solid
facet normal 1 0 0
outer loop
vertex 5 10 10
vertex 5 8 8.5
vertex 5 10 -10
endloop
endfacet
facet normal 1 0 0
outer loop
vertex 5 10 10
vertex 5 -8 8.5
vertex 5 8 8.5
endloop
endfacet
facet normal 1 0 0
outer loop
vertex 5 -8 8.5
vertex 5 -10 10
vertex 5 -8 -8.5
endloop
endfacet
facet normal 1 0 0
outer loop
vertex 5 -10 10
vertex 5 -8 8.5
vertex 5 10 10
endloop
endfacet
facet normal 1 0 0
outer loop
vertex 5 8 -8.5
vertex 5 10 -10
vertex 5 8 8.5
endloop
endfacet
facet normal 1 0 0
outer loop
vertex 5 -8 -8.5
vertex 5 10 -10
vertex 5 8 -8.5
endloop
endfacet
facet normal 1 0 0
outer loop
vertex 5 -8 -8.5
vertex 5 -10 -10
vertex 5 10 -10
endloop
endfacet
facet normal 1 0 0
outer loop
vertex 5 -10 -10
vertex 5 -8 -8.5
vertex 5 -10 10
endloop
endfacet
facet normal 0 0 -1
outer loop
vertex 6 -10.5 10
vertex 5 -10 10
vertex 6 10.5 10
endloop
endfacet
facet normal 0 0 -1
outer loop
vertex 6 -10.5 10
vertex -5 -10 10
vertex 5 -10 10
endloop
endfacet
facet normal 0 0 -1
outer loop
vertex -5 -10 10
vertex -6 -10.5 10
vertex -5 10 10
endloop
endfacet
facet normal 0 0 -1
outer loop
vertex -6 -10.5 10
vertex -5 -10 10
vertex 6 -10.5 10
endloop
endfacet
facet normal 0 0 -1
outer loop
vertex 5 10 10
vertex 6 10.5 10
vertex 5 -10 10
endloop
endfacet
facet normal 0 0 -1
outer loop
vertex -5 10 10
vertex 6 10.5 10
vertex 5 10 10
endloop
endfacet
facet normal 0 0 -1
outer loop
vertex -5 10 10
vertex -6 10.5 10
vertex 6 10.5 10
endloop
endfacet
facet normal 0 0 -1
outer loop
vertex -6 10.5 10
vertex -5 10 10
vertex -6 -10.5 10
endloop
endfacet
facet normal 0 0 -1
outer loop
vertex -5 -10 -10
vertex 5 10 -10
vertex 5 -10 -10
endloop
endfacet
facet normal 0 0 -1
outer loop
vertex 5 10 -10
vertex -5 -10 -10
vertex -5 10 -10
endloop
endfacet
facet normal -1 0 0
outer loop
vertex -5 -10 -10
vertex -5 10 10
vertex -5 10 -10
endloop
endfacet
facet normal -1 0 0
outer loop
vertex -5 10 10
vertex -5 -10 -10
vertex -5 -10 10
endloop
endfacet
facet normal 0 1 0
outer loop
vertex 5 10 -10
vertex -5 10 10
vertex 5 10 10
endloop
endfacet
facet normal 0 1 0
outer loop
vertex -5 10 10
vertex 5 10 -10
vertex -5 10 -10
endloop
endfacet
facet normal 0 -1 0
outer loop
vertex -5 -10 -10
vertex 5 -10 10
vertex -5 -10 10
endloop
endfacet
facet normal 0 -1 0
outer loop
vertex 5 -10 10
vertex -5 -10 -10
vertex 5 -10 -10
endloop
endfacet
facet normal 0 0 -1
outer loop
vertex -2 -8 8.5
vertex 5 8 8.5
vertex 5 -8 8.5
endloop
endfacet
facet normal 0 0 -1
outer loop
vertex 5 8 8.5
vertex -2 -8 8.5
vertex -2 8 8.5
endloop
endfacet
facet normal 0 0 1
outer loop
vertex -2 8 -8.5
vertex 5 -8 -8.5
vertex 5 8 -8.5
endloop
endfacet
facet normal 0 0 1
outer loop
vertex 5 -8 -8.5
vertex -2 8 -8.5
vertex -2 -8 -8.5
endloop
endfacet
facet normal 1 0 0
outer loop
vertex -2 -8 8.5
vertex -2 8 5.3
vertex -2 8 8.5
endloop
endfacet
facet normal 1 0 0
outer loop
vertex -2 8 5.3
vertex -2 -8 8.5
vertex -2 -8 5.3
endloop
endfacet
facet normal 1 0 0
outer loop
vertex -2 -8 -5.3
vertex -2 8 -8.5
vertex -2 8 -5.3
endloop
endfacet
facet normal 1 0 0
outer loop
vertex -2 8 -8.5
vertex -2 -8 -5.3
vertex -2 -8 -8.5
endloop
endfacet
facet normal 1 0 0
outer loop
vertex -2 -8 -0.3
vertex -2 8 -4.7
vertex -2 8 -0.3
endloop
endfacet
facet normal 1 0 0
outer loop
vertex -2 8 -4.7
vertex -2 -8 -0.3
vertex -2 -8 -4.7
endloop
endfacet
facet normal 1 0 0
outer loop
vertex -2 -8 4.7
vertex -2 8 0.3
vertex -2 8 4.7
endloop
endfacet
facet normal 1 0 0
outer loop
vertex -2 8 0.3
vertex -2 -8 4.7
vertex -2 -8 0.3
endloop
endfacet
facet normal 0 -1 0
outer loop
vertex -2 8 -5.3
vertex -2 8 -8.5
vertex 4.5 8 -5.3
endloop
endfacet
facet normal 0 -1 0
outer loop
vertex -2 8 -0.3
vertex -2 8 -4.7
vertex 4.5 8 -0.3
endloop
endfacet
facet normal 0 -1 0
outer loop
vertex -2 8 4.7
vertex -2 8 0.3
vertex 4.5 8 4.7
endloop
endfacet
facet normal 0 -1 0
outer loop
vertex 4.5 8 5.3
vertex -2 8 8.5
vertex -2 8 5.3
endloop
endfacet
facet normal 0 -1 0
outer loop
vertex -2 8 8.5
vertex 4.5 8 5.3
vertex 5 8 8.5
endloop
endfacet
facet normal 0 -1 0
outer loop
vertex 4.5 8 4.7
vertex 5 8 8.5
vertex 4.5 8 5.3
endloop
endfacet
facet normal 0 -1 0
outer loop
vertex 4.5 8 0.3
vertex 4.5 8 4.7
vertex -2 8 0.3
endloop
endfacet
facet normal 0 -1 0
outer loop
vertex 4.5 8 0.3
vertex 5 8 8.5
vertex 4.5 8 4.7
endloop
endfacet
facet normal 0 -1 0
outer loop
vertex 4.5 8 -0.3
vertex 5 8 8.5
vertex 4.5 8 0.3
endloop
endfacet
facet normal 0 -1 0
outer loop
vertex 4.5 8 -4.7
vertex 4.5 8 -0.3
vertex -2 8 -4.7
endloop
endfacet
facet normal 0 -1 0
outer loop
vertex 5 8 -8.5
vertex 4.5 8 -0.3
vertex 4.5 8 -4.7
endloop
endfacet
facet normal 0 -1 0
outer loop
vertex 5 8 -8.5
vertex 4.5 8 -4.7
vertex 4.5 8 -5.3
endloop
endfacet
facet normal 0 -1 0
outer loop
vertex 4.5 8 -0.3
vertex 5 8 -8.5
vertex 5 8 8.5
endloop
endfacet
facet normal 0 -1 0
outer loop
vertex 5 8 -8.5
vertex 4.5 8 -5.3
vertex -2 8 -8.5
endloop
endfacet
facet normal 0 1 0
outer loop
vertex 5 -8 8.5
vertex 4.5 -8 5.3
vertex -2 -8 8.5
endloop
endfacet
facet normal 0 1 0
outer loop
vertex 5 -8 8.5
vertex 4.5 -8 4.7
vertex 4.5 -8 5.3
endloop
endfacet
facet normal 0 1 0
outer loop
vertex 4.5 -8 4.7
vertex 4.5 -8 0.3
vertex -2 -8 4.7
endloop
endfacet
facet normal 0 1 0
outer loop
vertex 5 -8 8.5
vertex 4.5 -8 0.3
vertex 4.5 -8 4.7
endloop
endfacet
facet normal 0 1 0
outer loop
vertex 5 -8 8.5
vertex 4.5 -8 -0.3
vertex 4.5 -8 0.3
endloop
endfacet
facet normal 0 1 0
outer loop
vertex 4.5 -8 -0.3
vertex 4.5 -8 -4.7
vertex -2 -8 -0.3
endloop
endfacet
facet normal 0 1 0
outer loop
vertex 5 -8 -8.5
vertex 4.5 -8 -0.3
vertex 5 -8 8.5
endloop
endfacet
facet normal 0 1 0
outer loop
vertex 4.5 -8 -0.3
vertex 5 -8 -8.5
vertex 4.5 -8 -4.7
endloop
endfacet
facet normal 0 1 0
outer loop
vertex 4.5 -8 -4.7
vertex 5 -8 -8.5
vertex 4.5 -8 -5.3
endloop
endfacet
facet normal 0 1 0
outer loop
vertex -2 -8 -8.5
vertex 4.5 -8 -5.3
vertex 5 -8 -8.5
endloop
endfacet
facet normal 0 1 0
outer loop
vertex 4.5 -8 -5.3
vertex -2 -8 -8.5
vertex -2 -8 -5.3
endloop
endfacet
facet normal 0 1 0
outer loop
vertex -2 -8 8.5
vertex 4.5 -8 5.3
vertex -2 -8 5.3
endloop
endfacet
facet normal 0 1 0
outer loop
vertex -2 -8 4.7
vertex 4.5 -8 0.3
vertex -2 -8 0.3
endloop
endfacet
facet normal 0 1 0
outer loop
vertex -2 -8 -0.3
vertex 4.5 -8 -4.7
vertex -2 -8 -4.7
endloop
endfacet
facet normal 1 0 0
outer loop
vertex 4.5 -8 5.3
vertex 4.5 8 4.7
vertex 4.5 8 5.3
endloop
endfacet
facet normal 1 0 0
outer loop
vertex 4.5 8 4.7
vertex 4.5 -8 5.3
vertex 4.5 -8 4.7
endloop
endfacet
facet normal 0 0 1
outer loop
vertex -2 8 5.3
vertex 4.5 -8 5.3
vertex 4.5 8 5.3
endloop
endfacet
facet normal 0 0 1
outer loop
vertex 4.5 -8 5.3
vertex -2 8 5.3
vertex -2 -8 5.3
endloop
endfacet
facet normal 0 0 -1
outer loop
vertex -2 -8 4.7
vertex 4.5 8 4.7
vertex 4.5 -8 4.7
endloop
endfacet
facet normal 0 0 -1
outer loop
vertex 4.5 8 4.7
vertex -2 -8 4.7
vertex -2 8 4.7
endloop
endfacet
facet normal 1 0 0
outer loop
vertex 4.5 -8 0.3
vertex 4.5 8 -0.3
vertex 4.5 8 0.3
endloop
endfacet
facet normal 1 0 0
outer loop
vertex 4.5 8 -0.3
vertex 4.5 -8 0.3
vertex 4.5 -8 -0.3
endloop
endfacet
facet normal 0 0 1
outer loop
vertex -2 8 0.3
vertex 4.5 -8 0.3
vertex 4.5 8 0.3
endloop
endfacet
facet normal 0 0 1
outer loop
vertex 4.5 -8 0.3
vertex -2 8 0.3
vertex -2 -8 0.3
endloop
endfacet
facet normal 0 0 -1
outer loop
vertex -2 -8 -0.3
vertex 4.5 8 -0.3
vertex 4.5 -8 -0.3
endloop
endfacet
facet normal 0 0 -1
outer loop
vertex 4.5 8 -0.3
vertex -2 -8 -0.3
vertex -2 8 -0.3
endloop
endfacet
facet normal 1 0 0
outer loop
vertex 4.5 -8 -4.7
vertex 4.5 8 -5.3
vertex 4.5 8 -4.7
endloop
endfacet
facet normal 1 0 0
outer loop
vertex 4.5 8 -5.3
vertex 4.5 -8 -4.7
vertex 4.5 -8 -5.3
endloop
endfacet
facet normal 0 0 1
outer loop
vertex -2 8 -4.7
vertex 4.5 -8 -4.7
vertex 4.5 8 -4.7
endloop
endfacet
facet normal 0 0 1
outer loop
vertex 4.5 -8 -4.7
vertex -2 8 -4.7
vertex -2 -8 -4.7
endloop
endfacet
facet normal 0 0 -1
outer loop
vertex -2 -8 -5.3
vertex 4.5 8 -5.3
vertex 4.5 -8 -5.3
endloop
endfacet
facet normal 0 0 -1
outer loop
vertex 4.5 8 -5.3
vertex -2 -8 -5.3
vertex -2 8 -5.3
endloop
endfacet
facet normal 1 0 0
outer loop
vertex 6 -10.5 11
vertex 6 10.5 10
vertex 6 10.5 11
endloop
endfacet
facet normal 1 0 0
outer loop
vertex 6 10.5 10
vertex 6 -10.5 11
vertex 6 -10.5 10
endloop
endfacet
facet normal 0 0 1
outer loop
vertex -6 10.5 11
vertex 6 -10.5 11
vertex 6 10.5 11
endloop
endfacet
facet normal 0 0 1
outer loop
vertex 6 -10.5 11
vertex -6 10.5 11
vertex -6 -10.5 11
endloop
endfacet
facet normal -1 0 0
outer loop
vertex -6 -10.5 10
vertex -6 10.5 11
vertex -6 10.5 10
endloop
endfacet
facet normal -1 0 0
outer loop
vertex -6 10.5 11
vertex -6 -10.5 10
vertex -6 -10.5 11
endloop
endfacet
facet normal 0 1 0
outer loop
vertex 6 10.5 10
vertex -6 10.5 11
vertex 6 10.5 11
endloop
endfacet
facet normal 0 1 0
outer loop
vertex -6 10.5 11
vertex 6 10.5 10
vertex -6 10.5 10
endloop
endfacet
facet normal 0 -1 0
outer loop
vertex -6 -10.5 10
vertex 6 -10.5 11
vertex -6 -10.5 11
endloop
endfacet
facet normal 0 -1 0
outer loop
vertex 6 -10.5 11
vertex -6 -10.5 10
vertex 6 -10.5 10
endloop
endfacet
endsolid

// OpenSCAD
difference(){
color("#bd9476")
cube([10,20,20],center=true);

color("#d5b07c")
translate([2,0,0])
cube([8,16,17],center=true);



}

color("#4f200f")
translate([0.5,0,5])
cube([8,16,0.6],center=true);


color("#4f200f")
translate([0.5,0,-0])
cube([8,16,0.6],center=true);

color("#4f200f")
translate([0.5,0,-5])
cube([8,16,0.6],center=true);


color("#4f200f")
translate([0,0,10.5])
cube([12,21,1],center=true);
